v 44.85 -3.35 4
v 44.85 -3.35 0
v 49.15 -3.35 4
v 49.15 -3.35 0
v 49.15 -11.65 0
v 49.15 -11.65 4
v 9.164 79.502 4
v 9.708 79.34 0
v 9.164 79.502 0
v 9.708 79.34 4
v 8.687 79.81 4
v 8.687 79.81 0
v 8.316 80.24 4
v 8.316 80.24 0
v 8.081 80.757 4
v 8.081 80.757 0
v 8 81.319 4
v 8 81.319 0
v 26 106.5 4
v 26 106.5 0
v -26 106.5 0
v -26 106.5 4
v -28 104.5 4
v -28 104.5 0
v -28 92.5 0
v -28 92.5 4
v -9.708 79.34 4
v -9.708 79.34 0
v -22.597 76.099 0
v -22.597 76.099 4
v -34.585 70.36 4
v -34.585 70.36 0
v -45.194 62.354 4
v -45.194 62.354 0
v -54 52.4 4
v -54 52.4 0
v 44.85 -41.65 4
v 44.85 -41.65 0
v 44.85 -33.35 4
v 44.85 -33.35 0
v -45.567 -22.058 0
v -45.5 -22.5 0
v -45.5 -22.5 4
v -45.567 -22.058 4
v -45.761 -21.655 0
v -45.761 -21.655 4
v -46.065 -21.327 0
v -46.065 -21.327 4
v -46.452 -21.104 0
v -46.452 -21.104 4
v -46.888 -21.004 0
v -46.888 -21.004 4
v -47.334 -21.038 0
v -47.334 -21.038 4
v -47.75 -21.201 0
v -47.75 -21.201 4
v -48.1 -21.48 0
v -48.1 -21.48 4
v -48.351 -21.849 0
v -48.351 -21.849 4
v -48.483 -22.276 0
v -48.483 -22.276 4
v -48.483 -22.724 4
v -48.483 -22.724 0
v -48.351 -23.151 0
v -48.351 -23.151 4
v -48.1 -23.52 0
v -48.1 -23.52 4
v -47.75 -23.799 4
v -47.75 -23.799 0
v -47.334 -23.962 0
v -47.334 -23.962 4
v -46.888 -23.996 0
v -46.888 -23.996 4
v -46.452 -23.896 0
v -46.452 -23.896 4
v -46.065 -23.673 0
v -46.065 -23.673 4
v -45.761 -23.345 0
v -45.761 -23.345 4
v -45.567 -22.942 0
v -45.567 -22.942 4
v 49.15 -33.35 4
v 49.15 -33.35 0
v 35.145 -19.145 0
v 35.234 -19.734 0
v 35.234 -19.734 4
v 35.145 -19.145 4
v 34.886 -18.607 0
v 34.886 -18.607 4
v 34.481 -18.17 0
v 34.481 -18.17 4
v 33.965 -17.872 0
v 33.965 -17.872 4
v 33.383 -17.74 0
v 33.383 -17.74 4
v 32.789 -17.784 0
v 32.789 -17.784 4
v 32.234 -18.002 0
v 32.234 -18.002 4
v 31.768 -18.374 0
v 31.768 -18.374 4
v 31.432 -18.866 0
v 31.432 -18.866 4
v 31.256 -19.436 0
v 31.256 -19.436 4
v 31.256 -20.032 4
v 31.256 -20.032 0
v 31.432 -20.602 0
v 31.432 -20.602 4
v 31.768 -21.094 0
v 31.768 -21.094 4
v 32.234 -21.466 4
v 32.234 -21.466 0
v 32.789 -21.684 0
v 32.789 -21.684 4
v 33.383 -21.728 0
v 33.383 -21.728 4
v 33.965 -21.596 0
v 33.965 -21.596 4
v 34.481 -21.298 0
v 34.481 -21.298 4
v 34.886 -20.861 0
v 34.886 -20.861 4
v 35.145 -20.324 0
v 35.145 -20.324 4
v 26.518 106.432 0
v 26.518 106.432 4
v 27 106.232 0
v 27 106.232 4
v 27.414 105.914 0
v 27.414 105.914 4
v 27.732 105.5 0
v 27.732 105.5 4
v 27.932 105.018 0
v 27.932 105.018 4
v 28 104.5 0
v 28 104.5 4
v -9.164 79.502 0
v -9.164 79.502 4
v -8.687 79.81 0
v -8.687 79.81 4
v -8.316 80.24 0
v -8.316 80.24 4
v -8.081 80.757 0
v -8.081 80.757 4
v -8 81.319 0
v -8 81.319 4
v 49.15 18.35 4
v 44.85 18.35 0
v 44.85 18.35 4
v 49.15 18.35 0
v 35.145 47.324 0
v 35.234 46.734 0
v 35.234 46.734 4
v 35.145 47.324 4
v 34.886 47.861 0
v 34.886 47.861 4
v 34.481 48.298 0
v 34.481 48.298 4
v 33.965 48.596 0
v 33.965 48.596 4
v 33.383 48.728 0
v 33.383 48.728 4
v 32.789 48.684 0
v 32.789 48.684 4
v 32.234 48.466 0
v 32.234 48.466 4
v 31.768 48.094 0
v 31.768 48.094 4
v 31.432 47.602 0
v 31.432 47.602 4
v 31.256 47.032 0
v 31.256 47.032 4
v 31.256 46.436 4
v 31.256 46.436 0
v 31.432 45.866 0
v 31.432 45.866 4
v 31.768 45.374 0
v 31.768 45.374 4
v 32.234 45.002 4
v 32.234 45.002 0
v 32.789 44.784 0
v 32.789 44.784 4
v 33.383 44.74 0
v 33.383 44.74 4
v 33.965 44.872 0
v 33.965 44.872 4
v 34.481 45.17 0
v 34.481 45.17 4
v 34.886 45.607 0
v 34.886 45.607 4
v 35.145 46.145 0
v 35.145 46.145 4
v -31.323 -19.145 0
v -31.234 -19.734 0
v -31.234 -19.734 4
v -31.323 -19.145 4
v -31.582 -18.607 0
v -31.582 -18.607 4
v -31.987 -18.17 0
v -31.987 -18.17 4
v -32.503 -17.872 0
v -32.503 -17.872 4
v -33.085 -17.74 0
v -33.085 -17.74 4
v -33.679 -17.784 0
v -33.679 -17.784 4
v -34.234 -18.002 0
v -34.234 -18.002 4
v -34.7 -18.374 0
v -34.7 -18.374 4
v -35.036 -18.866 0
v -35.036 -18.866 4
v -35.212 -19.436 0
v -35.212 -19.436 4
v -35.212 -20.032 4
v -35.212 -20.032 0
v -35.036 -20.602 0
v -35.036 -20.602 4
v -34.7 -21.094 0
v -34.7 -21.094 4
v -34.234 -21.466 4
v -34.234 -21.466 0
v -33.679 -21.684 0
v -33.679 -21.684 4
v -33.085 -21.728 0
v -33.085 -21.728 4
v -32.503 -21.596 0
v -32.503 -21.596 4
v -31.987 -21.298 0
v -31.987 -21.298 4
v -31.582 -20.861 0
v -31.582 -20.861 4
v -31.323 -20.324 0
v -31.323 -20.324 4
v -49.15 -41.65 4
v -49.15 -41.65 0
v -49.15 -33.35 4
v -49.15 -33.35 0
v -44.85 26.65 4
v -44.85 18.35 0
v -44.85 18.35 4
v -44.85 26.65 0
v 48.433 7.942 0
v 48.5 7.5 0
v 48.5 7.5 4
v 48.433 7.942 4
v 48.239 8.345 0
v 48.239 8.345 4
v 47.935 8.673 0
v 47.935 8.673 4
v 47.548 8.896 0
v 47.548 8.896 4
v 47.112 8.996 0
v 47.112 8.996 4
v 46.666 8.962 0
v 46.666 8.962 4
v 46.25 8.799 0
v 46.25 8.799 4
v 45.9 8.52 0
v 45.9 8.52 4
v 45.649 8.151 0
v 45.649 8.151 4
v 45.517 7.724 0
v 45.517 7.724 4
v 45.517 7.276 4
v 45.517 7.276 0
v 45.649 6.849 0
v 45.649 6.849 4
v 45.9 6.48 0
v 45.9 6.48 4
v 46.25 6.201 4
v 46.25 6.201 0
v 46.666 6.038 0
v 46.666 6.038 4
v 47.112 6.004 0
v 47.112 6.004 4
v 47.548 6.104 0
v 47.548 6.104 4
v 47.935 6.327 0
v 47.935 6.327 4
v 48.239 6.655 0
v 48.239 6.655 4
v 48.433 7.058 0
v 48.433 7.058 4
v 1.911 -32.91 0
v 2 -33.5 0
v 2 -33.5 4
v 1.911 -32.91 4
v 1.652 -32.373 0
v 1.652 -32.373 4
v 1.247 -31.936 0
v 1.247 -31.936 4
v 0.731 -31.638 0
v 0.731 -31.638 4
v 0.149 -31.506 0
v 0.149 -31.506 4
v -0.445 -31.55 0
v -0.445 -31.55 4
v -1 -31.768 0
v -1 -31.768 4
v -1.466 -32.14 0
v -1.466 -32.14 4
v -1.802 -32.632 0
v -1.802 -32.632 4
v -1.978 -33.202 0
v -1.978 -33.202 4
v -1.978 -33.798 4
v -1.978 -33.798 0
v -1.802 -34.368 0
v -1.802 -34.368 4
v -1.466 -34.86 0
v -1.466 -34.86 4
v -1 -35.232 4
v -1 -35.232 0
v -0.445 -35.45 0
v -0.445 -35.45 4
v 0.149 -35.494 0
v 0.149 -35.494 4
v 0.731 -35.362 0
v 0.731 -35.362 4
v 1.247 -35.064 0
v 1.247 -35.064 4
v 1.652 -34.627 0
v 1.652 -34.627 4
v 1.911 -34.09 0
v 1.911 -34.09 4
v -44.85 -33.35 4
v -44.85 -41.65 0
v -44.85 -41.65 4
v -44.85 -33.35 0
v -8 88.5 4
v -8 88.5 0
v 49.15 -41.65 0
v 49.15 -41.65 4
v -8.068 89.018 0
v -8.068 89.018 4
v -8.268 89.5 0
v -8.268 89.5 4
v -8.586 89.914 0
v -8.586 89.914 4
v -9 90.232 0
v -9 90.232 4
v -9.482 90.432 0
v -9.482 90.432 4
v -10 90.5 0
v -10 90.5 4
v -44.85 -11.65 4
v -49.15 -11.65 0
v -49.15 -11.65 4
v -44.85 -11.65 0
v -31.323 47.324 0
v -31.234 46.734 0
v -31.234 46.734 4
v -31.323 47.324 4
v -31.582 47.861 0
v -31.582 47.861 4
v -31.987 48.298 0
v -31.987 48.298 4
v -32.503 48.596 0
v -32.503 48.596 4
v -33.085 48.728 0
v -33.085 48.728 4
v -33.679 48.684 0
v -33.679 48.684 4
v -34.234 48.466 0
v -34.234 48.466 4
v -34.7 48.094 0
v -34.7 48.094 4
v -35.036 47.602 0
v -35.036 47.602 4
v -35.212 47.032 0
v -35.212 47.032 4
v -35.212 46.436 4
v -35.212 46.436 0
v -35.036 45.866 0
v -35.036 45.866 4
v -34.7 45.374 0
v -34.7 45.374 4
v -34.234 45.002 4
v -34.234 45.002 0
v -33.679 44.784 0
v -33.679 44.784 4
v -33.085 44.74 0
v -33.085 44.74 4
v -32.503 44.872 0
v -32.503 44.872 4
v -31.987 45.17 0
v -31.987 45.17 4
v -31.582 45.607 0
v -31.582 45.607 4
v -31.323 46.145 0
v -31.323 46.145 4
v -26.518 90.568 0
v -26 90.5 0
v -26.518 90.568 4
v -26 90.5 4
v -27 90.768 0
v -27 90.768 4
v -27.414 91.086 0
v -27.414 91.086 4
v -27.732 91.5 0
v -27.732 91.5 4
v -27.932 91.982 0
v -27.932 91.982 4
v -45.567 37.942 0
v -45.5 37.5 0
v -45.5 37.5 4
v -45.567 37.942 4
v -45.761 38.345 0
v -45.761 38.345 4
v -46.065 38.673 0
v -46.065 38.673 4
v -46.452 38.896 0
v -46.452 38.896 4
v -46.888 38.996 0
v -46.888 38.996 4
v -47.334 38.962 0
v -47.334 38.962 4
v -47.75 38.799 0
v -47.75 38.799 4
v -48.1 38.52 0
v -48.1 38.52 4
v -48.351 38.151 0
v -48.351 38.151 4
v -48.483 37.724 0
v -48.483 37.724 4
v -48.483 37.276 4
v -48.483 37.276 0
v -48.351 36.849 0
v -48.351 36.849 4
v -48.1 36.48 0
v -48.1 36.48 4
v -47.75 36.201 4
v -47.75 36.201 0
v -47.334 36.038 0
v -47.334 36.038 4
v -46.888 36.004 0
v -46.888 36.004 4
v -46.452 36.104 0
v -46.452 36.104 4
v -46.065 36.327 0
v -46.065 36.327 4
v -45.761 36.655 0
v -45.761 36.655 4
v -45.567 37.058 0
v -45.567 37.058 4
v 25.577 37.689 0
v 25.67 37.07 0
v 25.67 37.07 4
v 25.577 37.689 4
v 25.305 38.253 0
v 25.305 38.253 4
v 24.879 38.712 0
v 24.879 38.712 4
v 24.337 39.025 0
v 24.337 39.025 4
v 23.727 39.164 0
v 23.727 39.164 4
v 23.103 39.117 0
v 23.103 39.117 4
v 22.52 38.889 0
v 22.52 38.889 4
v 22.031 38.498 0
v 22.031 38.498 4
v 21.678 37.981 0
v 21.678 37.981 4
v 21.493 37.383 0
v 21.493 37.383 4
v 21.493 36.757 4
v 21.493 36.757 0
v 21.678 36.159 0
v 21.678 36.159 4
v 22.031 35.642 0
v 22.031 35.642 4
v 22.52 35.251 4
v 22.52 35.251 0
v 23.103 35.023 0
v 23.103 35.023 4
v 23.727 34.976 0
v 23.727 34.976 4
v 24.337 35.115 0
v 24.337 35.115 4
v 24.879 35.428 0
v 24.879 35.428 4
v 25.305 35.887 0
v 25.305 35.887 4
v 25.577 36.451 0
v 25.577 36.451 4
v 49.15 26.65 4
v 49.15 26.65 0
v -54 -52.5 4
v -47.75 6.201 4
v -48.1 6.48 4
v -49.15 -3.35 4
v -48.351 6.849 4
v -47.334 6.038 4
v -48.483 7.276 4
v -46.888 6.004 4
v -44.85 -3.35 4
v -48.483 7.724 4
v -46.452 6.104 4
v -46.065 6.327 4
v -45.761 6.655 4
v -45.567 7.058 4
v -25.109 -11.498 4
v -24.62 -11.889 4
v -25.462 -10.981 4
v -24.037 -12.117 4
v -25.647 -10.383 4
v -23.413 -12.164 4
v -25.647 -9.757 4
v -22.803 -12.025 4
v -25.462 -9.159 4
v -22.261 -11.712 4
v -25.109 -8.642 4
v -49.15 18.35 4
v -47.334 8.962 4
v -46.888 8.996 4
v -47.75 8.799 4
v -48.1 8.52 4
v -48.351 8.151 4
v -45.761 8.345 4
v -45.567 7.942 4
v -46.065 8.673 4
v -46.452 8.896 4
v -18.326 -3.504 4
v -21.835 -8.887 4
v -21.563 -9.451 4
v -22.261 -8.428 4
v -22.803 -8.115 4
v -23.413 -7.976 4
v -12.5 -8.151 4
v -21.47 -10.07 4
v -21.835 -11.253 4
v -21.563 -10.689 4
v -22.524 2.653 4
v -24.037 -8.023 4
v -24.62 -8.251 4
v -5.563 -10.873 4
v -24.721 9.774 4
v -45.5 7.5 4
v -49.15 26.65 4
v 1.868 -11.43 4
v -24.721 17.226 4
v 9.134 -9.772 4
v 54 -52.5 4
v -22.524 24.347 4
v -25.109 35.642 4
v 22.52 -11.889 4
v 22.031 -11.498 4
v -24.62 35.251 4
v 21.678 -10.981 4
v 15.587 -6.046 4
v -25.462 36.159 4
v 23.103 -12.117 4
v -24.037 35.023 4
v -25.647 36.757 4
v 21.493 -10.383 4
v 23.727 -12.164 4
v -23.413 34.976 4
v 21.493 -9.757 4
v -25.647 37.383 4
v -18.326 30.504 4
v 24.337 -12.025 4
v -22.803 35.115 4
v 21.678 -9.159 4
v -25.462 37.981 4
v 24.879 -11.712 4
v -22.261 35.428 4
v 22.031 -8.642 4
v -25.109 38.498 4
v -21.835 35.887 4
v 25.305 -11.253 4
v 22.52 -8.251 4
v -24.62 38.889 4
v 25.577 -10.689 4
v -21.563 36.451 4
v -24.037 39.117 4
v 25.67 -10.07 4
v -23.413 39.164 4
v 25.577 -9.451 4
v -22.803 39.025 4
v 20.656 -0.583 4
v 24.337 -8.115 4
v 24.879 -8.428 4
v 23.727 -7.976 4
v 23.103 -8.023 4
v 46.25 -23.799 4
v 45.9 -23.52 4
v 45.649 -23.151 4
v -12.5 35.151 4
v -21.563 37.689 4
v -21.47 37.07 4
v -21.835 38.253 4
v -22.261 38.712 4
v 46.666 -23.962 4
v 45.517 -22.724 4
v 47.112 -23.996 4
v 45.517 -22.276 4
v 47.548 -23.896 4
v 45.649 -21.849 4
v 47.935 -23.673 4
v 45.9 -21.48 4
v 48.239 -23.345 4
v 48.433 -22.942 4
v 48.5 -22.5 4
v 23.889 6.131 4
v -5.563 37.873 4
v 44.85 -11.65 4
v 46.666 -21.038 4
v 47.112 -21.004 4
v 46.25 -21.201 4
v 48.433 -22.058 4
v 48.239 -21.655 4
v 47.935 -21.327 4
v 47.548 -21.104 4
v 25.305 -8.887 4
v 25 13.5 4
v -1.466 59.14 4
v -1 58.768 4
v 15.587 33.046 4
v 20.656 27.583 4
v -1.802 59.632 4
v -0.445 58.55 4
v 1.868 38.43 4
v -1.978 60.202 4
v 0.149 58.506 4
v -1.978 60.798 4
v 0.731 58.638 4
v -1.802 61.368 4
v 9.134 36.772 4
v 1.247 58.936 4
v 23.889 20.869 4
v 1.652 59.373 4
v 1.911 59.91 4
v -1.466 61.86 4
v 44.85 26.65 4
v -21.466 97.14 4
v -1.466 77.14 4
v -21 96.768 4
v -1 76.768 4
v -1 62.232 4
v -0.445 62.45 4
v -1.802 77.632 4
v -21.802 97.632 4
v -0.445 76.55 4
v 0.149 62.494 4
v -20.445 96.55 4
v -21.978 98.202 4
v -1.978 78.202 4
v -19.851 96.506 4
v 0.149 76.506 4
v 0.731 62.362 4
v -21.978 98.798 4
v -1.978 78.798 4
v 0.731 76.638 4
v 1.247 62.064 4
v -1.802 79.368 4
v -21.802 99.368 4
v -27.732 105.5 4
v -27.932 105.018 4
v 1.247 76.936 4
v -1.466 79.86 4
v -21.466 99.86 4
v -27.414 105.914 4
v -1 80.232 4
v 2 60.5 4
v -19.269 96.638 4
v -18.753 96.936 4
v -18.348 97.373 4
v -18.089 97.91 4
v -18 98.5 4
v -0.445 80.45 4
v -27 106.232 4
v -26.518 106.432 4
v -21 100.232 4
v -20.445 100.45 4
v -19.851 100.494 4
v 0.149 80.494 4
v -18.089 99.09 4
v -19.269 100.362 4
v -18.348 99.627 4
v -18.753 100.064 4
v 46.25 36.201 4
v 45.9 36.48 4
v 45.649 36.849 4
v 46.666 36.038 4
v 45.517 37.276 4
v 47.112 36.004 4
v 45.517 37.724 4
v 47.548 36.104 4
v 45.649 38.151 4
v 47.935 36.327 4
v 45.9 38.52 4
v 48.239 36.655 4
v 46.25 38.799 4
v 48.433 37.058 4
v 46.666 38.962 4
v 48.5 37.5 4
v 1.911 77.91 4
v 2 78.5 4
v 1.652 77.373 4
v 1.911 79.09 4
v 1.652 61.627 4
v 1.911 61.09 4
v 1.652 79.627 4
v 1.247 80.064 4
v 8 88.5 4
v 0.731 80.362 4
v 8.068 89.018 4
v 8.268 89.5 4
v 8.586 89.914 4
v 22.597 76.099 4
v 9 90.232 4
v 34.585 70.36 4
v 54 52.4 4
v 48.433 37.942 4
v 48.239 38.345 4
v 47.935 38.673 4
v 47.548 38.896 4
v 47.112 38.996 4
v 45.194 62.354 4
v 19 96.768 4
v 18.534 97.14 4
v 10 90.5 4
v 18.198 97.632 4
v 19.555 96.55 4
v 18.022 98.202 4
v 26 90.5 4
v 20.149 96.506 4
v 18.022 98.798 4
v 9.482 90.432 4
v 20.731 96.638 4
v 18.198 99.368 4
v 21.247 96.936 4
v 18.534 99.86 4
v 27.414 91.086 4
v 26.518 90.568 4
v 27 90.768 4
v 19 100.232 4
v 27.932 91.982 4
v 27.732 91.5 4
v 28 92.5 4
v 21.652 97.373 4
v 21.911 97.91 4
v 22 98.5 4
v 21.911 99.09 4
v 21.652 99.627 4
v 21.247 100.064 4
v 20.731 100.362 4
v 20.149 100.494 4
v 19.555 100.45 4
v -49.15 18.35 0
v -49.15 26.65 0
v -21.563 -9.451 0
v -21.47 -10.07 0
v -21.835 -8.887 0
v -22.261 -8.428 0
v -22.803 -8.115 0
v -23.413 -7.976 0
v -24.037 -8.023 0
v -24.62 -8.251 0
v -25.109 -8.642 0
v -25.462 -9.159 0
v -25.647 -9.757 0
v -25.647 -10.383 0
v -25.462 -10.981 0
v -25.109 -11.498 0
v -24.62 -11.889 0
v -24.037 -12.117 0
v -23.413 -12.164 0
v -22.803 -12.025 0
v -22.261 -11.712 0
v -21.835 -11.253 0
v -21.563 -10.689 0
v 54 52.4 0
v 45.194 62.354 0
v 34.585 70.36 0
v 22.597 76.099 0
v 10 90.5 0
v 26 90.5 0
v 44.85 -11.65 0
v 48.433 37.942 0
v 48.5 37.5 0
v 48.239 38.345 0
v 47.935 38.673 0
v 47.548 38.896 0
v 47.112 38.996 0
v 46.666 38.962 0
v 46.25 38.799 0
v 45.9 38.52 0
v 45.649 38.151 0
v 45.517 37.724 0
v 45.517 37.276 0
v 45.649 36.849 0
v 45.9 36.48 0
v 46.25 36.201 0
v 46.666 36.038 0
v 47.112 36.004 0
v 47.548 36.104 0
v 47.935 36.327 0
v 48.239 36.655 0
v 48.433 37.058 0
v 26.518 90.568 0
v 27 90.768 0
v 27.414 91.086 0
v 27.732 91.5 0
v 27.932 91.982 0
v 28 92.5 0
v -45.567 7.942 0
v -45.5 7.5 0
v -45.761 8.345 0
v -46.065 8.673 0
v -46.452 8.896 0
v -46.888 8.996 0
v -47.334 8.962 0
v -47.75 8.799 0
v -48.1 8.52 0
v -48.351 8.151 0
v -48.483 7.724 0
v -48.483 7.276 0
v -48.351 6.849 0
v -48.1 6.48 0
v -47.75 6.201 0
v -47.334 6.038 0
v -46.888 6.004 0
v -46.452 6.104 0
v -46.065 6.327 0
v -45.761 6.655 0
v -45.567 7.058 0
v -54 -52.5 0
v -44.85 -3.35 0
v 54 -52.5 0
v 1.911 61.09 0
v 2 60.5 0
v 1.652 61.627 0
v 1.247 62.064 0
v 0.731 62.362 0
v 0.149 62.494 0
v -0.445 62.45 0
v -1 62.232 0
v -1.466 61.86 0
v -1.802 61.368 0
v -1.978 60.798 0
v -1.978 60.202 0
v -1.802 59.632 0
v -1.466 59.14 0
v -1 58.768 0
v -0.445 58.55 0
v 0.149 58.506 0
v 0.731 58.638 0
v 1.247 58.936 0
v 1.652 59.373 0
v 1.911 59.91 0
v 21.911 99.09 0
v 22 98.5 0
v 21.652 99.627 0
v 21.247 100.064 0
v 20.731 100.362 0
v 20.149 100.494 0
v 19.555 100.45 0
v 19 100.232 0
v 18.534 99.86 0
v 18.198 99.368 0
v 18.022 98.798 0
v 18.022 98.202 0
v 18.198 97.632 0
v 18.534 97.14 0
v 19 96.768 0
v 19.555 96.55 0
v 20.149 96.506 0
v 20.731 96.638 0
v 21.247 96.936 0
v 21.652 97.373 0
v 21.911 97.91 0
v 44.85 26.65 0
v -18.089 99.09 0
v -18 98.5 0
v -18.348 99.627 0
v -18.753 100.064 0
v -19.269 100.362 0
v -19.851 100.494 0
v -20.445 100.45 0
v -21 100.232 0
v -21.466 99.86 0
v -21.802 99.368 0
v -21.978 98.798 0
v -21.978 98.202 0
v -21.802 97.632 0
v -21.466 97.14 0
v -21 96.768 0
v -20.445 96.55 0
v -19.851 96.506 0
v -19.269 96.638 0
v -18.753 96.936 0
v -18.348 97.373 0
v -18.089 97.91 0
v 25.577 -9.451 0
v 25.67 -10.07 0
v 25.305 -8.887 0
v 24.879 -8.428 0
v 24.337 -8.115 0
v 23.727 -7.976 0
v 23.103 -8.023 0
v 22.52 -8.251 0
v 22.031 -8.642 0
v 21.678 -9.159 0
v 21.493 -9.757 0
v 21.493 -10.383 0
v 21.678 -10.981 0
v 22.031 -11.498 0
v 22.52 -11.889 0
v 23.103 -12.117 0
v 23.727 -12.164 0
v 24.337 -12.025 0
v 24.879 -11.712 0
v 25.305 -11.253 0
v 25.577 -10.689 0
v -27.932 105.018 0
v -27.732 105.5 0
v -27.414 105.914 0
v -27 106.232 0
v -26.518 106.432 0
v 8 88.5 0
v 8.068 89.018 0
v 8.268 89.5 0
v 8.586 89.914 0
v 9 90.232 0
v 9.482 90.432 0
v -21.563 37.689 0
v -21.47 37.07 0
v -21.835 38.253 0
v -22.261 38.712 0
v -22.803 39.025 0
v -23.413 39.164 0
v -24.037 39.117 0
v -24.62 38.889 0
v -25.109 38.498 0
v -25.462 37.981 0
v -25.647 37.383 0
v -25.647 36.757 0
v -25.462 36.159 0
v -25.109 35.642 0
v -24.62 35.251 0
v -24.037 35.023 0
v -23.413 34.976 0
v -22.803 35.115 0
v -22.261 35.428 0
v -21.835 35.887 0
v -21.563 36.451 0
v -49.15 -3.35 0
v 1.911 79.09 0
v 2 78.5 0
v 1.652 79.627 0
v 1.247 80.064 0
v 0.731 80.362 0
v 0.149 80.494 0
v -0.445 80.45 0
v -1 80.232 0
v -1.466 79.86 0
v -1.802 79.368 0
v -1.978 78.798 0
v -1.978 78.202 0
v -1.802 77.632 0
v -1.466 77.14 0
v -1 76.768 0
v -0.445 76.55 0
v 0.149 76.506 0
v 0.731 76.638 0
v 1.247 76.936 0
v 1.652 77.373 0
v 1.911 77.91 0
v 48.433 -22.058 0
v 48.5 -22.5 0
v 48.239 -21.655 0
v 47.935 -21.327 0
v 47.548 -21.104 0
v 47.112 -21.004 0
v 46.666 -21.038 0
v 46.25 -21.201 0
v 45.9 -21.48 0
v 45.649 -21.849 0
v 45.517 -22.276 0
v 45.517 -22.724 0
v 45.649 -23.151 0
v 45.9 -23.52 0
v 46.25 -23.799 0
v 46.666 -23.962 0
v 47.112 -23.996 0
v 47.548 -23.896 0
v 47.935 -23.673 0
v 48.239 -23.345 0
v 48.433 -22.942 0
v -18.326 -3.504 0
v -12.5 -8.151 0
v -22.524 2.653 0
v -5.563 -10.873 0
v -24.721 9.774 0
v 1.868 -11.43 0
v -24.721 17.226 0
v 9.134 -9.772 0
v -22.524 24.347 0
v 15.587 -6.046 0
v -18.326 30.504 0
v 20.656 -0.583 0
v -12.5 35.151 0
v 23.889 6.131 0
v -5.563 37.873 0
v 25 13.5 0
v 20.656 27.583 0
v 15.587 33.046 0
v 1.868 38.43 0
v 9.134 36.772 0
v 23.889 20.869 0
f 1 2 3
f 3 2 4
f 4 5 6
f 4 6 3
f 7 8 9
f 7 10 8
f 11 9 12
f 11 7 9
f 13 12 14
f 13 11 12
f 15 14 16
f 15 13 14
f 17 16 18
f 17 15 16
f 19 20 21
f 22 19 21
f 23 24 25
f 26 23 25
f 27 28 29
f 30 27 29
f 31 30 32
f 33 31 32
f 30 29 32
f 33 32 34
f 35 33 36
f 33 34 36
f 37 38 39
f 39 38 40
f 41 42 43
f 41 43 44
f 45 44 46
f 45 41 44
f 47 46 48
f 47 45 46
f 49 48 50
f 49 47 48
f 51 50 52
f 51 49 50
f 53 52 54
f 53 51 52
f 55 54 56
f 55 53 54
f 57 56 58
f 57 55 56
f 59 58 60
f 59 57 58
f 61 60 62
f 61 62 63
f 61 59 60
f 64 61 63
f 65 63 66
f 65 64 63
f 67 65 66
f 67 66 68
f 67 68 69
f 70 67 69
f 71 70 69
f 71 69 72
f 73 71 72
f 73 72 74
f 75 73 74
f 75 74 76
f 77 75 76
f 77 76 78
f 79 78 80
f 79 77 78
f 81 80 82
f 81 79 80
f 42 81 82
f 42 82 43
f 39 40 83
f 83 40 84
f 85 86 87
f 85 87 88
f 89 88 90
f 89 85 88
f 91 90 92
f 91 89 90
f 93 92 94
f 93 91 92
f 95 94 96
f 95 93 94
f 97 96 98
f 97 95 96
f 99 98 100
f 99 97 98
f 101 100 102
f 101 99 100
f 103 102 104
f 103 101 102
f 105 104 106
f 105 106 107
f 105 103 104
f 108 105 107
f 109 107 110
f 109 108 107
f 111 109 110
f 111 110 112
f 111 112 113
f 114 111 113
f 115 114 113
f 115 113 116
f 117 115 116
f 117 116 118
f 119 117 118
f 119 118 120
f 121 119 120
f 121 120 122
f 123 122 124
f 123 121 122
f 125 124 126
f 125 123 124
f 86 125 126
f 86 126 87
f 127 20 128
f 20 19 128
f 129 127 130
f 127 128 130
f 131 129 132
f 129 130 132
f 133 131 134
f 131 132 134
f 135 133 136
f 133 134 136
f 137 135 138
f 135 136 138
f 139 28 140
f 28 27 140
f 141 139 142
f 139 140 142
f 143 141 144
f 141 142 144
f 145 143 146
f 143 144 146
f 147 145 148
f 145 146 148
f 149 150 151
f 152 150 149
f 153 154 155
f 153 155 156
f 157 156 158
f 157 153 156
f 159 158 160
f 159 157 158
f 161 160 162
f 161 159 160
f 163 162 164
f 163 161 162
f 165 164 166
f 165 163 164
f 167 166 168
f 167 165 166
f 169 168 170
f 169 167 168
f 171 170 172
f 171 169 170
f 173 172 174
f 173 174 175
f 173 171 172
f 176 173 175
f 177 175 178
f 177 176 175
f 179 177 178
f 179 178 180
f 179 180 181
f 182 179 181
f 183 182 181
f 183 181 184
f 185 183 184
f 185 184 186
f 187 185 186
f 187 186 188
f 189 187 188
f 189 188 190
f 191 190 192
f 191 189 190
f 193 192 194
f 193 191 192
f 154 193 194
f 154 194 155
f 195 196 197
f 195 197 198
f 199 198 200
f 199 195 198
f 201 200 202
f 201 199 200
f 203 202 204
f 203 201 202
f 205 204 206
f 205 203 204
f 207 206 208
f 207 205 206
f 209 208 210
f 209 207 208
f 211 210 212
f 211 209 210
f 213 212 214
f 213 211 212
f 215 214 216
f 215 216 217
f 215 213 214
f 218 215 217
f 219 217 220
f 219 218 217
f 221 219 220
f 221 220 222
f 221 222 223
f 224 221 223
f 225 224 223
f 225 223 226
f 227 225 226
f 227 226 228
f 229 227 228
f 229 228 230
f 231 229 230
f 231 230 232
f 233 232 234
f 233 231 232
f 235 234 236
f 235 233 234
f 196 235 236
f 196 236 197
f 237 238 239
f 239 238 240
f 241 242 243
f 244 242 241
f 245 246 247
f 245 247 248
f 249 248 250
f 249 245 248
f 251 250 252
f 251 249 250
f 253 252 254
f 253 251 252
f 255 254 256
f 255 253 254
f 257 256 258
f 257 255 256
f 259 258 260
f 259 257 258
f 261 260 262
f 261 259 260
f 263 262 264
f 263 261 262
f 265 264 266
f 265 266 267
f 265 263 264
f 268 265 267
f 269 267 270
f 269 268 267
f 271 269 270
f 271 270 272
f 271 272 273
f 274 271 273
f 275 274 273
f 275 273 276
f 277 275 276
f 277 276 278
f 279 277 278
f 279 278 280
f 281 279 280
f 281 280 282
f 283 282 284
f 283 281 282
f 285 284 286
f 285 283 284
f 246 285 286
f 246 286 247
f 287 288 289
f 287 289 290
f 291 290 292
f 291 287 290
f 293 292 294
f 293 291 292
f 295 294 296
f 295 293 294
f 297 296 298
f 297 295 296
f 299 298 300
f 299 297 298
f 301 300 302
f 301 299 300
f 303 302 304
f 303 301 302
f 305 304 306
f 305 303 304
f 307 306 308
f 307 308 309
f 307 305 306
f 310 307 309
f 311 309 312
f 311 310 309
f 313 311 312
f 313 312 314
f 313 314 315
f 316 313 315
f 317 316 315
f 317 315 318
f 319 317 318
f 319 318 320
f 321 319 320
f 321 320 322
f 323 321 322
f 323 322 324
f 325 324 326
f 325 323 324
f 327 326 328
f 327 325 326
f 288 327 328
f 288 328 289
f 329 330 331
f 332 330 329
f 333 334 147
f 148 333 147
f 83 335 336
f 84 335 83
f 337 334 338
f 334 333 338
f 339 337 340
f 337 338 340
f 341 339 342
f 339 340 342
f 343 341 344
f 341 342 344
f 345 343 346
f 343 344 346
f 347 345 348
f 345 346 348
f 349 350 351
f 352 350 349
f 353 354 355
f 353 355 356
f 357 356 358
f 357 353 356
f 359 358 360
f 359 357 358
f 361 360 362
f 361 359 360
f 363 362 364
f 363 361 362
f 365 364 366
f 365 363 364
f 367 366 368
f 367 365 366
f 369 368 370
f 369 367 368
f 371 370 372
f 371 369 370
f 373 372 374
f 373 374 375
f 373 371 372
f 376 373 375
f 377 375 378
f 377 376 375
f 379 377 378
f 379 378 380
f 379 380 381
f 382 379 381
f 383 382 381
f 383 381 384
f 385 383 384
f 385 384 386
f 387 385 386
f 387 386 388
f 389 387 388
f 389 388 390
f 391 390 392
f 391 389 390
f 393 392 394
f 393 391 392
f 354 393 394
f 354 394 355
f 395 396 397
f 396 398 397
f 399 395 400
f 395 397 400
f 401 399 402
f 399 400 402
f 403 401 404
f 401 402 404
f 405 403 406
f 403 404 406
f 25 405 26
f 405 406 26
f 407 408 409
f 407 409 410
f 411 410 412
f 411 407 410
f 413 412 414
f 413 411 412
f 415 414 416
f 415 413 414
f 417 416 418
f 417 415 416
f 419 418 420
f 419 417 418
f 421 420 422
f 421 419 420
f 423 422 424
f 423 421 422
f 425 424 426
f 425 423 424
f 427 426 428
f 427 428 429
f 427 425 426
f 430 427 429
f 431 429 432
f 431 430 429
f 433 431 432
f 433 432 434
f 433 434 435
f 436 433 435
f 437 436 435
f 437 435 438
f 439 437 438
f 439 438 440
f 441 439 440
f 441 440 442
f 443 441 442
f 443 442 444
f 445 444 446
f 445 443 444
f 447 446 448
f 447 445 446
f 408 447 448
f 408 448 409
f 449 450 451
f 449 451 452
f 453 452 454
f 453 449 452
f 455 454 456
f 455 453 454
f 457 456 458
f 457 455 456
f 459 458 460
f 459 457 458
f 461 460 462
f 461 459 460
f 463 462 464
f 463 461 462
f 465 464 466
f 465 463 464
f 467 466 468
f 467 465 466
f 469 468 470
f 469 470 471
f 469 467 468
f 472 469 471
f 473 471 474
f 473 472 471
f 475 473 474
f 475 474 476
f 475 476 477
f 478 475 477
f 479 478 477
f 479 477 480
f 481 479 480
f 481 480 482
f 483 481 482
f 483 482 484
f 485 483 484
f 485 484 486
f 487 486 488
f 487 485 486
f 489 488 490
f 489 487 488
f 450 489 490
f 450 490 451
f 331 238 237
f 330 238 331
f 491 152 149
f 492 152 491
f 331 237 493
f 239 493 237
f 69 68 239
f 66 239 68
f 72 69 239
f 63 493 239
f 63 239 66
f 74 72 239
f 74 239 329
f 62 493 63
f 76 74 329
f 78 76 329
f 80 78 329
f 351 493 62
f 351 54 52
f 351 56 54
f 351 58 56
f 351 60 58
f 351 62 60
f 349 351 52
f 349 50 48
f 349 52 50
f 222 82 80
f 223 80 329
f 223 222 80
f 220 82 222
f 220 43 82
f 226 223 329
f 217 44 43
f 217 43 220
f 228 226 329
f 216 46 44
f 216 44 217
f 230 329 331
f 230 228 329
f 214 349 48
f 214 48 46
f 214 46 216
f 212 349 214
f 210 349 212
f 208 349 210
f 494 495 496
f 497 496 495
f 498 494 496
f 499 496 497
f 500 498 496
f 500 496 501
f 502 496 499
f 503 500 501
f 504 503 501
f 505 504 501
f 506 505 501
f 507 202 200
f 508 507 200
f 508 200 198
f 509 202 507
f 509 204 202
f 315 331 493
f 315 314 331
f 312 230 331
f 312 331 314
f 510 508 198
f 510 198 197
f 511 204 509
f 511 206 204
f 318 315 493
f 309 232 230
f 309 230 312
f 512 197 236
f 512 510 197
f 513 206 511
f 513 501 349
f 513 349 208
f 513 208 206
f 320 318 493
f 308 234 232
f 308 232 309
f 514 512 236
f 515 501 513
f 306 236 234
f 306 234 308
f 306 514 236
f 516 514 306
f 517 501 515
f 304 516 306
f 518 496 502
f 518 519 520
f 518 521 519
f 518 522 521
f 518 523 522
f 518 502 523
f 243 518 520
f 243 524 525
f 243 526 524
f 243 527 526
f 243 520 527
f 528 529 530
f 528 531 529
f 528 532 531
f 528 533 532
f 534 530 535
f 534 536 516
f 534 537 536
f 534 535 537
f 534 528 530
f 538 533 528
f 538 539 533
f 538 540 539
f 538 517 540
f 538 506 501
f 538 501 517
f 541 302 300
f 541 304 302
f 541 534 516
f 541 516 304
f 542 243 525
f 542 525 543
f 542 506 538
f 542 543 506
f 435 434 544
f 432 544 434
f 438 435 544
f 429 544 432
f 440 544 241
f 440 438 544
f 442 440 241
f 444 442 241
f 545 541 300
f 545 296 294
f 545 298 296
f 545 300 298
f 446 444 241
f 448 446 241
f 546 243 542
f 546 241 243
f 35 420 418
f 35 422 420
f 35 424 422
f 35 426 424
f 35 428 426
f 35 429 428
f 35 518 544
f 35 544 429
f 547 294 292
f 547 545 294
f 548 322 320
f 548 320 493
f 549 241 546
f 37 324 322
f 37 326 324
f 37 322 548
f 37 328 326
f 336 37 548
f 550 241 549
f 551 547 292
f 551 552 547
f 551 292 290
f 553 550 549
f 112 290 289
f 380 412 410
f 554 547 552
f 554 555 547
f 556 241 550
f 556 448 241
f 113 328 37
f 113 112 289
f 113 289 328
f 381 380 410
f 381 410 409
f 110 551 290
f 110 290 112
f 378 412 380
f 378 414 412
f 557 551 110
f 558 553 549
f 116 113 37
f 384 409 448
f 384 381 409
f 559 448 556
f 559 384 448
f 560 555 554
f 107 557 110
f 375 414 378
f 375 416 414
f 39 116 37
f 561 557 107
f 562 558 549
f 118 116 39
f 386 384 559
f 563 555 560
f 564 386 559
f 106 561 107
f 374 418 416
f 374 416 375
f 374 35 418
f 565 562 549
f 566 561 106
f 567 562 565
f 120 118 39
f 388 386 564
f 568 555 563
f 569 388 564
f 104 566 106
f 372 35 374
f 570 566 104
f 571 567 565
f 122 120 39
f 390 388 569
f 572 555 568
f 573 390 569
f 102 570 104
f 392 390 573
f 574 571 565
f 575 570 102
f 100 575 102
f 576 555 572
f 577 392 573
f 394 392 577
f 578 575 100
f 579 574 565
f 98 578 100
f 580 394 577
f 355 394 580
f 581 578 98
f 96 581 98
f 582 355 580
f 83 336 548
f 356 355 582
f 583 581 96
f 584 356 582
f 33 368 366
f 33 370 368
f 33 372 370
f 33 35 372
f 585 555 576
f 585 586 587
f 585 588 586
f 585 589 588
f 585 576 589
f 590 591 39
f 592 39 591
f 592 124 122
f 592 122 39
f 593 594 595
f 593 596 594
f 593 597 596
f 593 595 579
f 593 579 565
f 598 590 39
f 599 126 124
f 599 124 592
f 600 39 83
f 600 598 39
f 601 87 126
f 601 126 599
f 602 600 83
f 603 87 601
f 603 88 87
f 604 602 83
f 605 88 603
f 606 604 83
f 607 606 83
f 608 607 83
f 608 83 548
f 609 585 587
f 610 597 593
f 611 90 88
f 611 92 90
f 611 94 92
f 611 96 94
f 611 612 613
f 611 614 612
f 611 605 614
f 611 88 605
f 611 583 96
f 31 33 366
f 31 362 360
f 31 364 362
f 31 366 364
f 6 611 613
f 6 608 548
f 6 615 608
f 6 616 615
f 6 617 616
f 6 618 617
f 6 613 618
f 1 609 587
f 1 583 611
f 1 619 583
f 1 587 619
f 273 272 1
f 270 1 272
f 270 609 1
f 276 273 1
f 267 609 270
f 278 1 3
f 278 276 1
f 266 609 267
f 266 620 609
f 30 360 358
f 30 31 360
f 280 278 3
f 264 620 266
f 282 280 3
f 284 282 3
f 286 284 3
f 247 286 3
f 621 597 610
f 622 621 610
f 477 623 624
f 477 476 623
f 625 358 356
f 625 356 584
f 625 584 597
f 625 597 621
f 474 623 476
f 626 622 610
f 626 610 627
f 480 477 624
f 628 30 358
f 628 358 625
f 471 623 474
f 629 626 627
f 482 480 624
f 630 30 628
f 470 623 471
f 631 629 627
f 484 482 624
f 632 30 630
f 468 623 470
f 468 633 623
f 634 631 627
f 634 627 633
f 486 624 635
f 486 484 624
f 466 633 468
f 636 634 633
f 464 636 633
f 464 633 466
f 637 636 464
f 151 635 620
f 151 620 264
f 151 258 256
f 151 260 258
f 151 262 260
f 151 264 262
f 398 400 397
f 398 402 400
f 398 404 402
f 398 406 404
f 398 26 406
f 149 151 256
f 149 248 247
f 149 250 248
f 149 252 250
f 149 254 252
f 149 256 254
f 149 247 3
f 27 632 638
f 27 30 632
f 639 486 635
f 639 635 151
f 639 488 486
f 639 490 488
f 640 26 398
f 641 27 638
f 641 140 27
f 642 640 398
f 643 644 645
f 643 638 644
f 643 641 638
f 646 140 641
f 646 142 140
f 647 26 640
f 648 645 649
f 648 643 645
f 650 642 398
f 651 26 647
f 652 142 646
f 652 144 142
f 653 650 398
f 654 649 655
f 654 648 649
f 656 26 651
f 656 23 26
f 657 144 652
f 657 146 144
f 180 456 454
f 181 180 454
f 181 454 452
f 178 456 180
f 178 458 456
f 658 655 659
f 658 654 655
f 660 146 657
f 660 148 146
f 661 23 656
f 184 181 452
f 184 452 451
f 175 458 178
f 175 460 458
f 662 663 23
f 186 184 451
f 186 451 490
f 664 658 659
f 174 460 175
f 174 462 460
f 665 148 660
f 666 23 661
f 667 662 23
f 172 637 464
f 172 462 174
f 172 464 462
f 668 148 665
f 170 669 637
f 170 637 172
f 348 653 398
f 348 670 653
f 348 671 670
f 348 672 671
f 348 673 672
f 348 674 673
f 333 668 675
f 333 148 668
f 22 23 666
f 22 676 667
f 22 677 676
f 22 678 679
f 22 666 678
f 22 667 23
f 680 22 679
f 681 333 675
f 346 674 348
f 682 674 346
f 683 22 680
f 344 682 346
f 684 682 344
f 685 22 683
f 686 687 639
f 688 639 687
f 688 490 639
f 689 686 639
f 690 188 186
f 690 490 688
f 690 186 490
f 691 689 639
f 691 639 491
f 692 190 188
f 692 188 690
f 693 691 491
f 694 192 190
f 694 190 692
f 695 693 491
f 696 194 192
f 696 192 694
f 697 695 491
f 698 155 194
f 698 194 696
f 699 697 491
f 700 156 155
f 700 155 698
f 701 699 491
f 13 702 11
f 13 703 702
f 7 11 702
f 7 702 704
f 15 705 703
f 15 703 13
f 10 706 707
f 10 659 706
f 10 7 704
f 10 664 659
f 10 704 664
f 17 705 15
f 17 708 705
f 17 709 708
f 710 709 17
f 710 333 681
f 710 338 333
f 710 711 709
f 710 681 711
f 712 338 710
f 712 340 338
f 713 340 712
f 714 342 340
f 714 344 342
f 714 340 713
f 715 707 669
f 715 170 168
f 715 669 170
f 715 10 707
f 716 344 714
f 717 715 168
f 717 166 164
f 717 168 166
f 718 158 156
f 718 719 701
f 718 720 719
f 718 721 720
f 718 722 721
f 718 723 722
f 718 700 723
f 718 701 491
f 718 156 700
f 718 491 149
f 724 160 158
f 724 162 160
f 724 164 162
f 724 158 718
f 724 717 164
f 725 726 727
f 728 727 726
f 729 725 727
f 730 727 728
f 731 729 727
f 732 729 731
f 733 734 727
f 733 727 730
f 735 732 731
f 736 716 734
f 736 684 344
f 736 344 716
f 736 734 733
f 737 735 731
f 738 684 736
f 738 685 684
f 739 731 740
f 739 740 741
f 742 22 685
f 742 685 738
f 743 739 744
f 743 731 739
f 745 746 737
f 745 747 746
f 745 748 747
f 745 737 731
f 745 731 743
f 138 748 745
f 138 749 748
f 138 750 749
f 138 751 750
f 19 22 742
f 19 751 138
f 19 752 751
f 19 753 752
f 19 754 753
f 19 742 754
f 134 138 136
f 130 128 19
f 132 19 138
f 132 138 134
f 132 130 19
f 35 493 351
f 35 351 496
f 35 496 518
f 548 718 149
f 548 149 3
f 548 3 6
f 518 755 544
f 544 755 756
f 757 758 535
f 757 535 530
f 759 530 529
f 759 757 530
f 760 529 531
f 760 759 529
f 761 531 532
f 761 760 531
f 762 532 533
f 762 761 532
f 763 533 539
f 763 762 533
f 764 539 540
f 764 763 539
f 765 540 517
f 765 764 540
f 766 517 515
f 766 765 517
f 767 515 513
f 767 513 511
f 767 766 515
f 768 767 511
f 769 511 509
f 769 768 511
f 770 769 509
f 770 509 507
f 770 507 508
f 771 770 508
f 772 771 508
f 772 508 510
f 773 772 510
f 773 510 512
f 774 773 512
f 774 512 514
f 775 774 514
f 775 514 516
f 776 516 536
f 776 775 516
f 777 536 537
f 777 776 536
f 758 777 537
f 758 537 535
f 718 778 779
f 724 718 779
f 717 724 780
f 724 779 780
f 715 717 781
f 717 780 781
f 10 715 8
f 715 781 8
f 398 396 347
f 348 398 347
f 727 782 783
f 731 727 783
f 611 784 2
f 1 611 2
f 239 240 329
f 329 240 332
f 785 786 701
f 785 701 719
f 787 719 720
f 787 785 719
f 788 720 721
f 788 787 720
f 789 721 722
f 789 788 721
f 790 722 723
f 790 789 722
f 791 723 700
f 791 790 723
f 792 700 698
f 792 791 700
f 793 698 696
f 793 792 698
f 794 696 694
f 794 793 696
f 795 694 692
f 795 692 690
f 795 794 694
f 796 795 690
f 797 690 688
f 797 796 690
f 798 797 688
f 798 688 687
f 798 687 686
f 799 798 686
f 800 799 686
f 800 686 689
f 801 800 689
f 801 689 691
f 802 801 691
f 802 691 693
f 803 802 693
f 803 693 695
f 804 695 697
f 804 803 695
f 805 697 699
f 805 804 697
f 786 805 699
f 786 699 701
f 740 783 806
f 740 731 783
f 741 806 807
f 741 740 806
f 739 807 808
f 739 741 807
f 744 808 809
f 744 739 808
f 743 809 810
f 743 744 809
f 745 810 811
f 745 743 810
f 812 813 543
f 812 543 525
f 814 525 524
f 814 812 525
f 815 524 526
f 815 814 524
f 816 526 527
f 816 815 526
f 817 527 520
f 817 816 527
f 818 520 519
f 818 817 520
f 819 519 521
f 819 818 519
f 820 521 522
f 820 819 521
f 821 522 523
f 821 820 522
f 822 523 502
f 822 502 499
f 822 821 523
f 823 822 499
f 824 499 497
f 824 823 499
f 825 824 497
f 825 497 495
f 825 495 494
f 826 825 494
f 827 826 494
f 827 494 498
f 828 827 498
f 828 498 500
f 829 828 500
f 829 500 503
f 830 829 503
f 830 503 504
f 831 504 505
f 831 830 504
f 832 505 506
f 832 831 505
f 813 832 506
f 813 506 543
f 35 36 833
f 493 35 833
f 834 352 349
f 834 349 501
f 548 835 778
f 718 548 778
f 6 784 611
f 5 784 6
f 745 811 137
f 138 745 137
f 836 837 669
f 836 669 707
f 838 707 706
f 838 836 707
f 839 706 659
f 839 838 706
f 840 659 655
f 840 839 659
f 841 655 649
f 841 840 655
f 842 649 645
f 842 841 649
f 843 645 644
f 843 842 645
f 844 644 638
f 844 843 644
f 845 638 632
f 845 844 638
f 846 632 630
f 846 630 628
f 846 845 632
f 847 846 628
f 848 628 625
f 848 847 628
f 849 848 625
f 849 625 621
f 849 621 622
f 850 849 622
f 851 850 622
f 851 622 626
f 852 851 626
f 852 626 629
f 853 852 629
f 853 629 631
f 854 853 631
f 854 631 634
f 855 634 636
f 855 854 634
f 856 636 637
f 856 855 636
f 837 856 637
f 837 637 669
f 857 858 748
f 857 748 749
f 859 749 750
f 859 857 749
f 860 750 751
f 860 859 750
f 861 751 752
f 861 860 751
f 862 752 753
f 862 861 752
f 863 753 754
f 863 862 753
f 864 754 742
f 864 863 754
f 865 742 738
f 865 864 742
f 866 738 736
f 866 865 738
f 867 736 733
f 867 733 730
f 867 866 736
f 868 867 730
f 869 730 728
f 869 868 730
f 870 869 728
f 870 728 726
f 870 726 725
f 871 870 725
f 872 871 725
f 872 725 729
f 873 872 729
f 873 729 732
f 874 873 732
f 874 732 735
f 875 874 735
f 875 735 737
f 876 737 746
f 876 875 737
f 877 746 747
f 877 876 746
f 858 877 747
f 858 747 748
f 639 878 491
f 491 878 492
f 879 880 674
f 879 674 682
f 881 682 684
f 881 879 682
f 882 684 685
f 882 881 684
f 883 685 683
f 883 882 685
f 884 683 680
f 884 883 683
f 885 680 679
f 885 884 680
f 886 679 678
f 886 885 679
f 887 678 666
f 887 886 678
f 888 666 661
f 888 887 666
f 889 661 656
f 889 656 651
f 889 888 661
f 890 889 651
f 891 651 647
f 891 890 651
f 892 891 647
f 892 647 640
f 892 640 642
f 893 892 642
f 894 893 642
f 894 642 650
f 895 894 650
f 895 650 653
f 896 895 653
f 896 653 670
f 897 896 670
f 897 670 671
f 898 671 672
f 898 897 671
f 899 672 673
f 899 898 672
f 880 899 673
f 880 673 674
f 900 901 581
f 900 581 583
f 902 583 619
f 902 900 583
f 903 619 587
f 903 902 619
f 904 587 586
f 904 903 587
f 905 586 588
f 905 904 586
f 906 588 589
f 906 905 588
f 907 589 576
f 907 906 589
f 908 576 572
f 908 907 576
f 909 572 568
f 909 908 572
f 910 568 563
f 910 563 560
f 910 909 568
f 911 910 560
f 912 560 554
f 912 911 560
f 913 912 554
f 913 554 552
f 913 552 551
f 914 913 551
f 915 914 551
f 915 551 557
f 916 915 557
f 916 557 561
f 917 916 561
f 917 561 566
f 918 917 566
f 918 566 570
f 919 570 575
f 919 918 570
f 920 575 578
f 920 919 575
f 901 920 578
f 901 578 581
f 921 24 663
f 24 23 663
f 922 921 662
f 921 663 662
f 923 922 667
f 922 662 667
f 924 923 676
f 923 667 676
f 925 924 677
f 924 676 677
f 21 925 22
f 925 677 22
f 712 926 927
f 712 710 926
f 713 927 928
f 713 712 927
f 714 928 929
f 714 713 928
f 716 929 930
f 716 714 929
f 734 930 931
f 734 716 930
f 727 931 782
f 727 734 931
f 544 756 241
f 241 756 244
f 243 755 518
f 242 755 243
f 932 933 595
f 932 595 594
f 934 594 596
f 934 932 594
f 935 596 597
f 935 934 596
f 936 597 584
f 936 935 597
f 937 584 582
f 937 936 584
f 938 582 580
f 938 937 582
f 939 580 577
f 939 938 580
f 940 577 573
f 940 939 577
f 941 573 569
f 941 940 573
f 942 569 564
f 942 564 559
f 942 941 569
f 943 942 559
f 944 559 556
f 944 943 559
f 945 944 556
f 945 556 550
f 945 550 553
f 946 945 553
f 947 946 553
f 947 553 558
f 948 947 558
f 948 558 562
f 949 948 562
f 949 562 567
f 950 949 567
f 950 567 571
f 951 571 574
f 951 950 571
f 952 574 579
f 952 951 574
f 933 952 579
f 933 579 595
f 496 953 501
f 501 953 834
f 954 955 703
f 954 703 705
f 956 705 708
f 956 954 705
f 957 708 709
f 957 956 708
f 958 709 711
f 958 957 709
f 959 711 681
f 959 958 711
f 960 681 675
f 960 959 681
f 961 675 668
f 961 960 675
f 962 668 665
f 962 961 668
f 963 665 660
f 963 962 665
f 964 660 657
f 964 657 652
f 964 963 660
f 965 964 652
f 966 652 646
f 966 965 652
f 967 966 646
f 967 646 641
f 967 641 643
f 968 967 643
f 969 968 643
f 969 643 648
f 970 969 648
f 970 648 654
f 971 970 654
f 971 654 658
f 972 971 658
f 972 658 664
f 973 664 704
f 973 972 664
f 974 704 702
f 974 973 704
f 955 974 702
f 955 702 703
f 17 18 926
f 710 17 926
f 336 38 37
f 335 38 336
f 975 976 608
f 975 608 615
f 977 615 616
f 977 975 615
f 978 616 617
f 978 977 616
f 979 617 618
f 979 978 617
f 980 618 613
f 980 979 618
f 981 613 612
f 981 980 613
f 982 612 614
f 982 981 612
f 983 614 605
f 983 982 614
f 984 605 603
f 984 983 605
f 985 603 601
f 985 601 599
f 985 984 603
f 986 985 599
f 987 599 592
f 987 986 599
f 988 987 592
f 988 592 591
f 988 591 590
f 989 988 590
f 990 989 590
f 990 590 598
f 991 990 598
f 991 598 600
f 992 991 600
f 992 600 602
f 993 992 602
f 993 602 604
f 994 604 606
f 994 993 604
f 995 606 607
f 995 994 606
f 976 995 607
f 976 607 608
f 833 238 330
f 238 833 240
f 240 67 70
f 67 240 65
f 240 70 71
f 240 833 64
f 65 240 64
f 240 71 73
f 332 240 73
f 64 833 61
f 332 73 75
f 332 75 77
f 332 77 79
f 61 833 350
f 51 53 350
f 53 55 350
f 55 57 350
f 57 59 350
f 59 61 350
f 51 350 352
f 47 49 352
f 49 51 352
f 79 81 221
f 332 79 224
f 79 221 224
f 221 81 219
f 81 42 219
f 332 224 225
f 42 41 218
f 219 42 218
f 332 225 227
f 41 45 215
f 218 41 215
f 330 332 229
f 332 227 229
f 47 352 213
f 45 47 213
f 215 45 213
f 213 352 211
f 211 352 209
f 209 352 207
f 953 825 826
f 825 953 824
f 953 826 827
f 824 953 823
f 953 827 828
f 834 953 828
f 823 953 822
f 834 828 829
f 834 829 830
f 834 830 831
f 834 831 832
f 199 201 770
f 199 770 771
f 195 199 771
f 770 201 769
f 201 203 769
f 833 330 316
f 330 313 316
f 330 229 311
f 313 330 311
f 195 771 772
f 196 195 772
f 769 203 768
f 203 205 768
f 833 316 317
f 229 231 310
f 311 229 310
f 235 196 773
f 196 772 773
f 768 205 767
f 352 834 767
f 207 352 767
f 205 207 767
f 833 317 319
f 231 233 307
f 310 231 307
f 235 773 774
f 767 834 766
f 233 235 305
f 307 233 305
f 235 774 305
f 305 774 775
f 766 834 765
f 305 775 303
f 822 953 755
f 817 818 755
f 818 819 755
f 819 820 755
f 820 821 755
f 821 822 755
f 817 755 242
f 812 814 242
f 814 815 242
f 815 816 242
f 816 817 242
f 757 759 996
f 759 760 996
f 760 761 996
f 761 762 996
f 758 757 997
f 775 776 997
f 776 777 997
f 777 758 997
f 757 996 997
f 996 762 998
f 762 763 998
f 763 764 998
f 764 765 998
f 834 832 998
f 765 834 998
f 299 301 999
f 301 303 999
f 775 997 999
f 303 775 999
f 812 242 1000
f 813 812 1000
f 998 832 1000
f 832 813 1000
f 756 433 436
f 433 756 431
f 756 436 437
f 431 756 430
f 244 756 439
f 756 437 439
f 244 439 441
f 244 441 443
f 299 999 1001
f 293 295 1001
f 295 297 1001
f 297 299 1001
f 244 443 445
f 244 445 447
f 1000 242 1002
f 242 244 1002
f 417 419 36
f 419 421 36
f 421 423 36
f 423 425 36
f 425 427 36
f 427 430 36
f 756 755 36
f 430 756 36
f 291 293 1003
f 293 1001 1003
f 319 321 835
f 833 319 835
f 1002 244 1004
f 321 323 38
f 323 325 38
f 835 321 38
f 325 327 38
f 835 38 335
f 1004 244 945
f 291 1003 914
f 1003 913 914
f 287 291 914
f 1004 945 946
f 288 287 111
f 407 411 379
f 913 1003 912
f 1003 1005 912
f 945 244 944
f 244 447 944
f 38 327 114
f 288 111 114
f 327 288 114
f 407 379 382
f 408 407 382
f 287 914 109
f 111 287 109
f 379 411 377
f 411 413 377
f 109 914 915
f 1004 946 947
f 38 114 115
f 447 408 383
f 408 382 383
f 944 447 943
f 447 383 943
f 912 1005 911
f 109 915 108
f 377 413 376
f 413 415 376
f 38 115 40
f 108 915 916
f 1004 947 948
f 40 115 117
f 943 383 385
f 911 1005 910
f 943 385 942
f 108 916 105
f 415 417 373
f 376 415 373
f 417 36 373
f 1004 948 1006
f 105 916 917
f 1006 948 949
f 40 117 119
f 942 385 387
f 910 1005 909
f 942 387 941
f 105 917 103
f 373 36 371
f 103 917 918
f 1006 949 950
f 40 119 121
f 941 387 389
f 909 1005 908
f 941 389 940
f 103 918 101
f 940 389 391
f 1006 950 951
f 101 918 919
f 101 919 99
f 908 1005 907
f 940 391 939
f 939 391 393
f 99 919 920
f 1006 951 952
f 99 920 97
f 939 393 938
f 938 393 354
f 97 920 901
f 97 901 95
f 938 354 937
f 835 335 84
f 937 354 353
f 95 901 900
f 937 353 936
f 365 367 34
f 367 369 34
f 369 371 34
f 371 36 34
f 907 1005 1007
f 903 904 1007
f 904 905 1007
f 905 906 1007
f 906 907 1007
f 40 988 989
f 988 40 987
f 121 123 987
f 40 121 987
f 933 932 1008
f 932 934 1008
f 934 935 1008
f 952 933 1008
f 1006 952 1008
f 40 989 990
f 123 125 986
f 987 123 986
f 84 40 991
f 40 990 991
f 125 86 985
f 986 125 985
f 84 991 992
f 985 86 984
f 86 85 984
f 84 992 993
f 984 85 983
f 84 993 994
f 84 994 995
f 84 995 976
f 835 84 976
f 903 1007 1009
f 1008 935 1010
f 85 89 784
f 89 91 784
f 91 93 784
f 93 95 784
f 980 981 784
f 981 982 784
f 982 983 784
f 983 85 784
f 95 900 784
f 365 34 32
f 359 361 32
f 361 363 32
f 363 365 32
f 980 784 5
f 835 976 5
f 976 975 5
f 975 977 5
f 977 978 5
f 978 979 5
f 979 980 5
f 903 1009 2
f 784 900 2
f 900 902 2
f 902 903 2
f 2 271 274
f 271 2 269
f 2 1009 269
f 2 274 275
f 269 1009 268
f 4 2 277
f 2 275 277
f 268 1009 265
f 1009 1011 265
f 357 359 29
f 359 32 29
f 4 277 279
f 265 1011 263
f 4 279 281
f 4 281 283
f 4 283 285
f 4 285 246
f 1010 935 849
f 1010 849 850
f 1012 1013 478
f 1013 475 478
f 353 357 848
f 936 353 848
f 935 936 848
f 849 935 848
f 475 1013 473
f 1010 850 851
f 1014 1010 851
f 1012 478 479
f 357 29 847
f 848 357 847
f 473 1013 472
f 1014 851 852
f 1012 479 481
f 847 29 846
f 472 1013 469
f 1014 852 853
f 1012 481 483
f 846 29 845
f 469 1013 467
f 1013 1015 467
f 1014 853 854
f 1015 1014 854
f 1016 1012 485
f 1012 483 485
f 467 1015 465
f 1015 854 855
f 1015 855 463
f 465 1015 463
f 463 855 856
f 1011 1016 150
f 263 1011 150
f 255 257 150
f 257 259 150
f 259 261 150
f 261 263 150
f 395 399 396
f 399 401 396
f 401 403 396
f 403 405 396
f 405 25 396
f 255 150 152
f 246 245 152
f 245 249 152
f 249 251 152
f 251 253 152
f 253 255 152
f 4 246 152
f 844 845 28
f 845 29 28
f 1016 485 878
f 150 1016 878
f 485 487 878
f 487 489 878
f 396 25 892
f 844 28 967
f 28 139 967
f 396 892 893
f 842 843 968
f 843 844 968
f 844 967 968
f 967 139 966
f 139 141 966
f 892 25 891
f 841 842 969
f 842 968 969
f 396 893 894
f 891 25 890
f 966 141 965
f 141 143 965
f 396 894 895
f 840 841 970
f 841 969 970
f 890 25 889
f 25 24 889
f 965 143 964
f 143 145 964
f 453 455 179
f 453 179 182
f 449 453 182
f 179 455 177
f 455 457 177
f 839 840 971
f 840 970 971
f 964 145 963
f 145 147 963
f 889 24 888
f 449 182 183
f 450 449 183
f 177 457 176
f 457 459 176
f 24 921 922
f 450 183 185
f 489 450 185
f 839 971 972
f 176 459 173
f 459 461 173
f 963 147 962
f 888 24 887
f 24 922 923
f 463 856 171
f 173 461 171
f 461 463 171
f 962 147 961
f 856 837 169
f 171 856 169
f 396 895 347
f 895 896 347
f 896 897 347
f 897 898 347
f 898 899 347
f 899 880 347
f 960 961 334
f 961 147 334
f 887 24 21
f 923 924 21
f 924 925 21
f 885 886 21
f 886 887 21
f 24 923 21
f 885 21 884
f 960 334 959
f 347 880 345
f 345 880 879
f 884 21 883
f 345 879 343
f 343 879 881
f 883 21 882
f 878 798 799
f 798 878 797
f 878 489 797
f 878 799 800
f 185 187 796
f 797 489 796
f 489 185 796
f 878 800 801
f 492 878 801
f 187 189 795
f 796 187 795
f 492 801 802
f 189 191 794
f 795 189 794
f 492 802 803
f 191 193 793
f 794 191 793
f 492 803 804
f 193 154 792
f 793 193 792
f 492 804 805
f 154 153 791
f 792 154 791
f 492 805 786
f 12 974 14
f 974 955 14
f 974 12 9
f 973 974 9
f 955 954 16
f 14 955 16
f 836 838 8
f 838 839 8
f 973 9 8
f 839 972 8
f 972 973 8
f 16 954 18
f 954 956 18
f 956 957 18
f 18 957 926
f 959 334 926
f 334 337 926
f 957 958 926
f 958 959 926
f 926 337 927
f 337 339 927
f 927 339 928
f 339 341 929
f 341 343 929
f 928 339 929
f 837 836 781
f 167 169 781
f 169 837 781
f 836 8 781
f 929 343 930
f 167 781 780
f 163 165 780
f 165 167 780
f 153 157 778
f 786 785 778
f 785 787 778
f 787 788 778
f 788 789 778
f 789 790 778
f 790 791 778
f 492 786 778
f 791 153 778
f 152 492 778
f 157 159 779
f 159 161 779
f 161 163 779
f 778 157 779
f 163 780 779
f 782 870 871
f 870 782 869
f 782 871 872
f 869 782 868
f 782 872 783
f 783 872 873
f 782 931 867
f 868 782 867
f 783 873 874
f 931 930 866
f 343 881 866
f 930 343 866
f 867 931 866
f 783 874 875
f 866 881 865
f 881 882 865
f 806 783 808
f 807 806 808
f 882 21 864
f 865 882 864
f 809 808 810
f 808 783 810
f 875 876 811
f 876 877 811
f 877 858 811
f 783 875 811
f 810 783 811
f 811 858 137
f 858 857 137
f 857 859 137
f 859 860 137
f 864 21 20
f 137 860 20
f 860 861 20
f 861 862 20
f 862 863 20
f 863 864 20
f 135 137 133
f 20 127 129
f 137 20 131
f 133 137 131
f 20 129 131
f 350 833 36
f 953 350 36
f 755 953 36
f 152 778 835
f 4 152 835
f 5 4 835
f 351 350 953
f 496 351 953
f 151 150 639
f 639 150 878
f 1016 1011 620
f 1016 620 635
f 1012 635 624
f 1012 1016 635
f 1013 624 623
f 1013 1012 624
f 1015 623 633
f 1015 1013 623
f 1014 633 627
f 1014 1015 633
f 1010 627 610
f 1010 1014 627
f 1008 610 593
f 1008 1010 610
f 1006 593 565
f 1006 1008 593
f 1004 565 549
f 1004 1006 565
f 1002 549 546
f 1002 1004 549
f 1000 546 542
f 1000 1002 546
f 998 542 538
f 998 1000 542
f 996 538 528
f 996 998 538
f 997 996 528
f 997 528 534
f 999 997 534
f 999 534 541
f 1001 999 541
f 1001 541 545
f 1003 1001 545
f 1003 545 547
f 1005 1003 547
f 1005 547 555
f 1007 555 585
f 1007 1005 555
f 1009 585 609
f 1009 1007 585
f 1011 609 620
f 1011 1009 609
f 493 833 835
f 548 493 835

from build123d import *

# Parameters (mm, degrees)
SKETCH_1_R      = 1.5
SKETCH_1_R_2    = 2.1
SKETCH_1_R_3    = 25
SKETCH_1_R_4    = 2
SKETCH_1_W      = 4.3
SKETCH_1_H      = 8.3
EXTRUDE_1_DEPTH = 4
FILLET_1_R      = 2


with BuildPart() as part:
    # 草图1 → 凸台-拉伸1 (new body)
    with BuildSketch(Plane.XY):
        with BuildLine():
            Line((-54, 52.4), (-54, -52.5))
            Line((-54, -52.5), (54, -52.5))
            Line((54, -52.5), (54, 52.4))
            ThreePointArc((54, 52.4), (33.845954515, 70.803240423), (8, 79.569735886))
            Line((8, 79.569735886), (8, 90.5))
            Line((8, 90.5), (28, 90.5))
            Line((28, 90.5), (28, 106.5))
            Line((28, 106.5), (-28, 106.5))
            Line((-28, 106.5), (-28, 90.5))
            Line((-28, 90.5), (-8, 90.5))
            Line((-8, 90.5), (-8, 79.569735886))
            ThreePointArc((-8, 79.569735886), (-33.845954515, 70.803240423), (-54, 52.4))
        make_face()
        with Locations((-47, 37.5)):
            Circle(SKETCH_1_R, mode=Mode.SUBTRACT)
        with Locations((-47, 7.5)):
            Circle(SKETCH_1_R, mode=Mode.SUBTRACT)
        with Locations((-47, -22.5)):
            Circle(SKETCH_1_R, mode=Mode.SUBTRACT)
        with Locations((-23.57, 37.07)):
            Circle(SKETCH_1_R_2, mode=Mode.SUBTRACT)
        with Locations((-23.57, -10.07)):
            Circle(SKETCH_1_R_2, mode=Mode.SUBTRACT)
        with Locations((23.57, -10.07)):
            Circle(SKETCH_1_R_2, mode=Mode.SUBTRACT)
        with Locations((23.57, 37.07)):
            Circle(SKETCH_1_R_2, mode=Mode.SUBTRACT)
        with Locations((47, -22.5)):
            Circle(SKETCH_1_R, mode=Mode.SUBTRACT)
        with Locations((47, 7.5)):
            Circle(SKETCH_1_R, mode=Mode.SUBTRACT)
        with Locations((47, 37.5)):
            Circle(SKETCH_1_R, mode=Mode.SUBTRACT)
        with Locations((0, 13.5)):
            Circle(SKETCH_1_R_3, mode=Mode.SUBTRACT)
        with Locations((0, 60.5)):
            Circle(SKETCH_1_R_4, mode=Mode.SUBTRACT)
        with Locations((33.234018716, 46.734018716)):
            Circle(SKETCH_1_R_4, mode=Mode.SUBTRACT)
        with Locations((33.234018716, -19.734018716)):
            Circle(SKETCH_1_R_4, mode=Mode.SUBTRACT)
        with Locations((0, -33.5)):
            Circle(SKETCH_1_R_4, mode=Mode.SUBTRACT)
        with Locations((-33.234018716, -19.734018716)):
            Circle(SKETCH_1_R_4, mode=Mode.SUBTRACT)
        with Locations((-33.234018716, 46.734018716)):
            Circle(SKETCH_1_R_4, mode=Mode.SUBTRACT)
        with Locations((0, 78.5)):
            Circle(SKETCH_1_R_4, mode=Mode.SUBTRACT)
        with Locations((-20, 98.5)):
            Circle(SKETCH_1_R_4, mode=Mode.SUBTRACT)
        with Locations((20, 98.5)):
            Circle(SKETCH_1_R_4, mode=Mode.SUBTRACT)
        with Locations((-47, 22.5)):
            Rectangle(SKETCH_1_W, SKETCH_1_H, mode=Mode.SUBTRACT)
        with Locations((-47, -7.5)):
            Rectangle(SKETCH_1_W, SKETCH_1_H, mode=Mode.SUBTRACT)
        with Locations((-47, -37.5)):
            Rectangle(SKETCH_1_W, SKETCH_1_H, mode=Mode.SUBTRACT)
        with Locations((47, -37.5)):
            Rectangle(SKETCH_1_W, SKETCH_1_H, mode=Mode.SUBTRACT)
        with Locations((47, -7.5)):
            Rectangle(SKETCH_1_W, SKETCH_1_H, mode=Mode.SUBTRACT)
        with Locations((47, 22.5)):
            Rectangle(SKETCH_1_W, SKETCH_1_H, mode=Mode.SUBTRACT)
    extrude(amount=EXTRUDE_1_DEPTH)

    # 圆角1
    fillet_1_edges = [part.edges().sort_by_distance(p)[0] for p in [
        (-8, 79.569735886, 2),
        (-8, 90.5, 2),
        (-28, 90.5, 2),
        (-28, 106.5, 2),
        (28, 106.5, 2),
        (28, 90.5, 2),
        (8, 90.5, 2),
        (8, 79.569735886, 2),
    ]]
    fillet(fillet_1_edges, radius=FILLET_1_R)


solid = part.part
